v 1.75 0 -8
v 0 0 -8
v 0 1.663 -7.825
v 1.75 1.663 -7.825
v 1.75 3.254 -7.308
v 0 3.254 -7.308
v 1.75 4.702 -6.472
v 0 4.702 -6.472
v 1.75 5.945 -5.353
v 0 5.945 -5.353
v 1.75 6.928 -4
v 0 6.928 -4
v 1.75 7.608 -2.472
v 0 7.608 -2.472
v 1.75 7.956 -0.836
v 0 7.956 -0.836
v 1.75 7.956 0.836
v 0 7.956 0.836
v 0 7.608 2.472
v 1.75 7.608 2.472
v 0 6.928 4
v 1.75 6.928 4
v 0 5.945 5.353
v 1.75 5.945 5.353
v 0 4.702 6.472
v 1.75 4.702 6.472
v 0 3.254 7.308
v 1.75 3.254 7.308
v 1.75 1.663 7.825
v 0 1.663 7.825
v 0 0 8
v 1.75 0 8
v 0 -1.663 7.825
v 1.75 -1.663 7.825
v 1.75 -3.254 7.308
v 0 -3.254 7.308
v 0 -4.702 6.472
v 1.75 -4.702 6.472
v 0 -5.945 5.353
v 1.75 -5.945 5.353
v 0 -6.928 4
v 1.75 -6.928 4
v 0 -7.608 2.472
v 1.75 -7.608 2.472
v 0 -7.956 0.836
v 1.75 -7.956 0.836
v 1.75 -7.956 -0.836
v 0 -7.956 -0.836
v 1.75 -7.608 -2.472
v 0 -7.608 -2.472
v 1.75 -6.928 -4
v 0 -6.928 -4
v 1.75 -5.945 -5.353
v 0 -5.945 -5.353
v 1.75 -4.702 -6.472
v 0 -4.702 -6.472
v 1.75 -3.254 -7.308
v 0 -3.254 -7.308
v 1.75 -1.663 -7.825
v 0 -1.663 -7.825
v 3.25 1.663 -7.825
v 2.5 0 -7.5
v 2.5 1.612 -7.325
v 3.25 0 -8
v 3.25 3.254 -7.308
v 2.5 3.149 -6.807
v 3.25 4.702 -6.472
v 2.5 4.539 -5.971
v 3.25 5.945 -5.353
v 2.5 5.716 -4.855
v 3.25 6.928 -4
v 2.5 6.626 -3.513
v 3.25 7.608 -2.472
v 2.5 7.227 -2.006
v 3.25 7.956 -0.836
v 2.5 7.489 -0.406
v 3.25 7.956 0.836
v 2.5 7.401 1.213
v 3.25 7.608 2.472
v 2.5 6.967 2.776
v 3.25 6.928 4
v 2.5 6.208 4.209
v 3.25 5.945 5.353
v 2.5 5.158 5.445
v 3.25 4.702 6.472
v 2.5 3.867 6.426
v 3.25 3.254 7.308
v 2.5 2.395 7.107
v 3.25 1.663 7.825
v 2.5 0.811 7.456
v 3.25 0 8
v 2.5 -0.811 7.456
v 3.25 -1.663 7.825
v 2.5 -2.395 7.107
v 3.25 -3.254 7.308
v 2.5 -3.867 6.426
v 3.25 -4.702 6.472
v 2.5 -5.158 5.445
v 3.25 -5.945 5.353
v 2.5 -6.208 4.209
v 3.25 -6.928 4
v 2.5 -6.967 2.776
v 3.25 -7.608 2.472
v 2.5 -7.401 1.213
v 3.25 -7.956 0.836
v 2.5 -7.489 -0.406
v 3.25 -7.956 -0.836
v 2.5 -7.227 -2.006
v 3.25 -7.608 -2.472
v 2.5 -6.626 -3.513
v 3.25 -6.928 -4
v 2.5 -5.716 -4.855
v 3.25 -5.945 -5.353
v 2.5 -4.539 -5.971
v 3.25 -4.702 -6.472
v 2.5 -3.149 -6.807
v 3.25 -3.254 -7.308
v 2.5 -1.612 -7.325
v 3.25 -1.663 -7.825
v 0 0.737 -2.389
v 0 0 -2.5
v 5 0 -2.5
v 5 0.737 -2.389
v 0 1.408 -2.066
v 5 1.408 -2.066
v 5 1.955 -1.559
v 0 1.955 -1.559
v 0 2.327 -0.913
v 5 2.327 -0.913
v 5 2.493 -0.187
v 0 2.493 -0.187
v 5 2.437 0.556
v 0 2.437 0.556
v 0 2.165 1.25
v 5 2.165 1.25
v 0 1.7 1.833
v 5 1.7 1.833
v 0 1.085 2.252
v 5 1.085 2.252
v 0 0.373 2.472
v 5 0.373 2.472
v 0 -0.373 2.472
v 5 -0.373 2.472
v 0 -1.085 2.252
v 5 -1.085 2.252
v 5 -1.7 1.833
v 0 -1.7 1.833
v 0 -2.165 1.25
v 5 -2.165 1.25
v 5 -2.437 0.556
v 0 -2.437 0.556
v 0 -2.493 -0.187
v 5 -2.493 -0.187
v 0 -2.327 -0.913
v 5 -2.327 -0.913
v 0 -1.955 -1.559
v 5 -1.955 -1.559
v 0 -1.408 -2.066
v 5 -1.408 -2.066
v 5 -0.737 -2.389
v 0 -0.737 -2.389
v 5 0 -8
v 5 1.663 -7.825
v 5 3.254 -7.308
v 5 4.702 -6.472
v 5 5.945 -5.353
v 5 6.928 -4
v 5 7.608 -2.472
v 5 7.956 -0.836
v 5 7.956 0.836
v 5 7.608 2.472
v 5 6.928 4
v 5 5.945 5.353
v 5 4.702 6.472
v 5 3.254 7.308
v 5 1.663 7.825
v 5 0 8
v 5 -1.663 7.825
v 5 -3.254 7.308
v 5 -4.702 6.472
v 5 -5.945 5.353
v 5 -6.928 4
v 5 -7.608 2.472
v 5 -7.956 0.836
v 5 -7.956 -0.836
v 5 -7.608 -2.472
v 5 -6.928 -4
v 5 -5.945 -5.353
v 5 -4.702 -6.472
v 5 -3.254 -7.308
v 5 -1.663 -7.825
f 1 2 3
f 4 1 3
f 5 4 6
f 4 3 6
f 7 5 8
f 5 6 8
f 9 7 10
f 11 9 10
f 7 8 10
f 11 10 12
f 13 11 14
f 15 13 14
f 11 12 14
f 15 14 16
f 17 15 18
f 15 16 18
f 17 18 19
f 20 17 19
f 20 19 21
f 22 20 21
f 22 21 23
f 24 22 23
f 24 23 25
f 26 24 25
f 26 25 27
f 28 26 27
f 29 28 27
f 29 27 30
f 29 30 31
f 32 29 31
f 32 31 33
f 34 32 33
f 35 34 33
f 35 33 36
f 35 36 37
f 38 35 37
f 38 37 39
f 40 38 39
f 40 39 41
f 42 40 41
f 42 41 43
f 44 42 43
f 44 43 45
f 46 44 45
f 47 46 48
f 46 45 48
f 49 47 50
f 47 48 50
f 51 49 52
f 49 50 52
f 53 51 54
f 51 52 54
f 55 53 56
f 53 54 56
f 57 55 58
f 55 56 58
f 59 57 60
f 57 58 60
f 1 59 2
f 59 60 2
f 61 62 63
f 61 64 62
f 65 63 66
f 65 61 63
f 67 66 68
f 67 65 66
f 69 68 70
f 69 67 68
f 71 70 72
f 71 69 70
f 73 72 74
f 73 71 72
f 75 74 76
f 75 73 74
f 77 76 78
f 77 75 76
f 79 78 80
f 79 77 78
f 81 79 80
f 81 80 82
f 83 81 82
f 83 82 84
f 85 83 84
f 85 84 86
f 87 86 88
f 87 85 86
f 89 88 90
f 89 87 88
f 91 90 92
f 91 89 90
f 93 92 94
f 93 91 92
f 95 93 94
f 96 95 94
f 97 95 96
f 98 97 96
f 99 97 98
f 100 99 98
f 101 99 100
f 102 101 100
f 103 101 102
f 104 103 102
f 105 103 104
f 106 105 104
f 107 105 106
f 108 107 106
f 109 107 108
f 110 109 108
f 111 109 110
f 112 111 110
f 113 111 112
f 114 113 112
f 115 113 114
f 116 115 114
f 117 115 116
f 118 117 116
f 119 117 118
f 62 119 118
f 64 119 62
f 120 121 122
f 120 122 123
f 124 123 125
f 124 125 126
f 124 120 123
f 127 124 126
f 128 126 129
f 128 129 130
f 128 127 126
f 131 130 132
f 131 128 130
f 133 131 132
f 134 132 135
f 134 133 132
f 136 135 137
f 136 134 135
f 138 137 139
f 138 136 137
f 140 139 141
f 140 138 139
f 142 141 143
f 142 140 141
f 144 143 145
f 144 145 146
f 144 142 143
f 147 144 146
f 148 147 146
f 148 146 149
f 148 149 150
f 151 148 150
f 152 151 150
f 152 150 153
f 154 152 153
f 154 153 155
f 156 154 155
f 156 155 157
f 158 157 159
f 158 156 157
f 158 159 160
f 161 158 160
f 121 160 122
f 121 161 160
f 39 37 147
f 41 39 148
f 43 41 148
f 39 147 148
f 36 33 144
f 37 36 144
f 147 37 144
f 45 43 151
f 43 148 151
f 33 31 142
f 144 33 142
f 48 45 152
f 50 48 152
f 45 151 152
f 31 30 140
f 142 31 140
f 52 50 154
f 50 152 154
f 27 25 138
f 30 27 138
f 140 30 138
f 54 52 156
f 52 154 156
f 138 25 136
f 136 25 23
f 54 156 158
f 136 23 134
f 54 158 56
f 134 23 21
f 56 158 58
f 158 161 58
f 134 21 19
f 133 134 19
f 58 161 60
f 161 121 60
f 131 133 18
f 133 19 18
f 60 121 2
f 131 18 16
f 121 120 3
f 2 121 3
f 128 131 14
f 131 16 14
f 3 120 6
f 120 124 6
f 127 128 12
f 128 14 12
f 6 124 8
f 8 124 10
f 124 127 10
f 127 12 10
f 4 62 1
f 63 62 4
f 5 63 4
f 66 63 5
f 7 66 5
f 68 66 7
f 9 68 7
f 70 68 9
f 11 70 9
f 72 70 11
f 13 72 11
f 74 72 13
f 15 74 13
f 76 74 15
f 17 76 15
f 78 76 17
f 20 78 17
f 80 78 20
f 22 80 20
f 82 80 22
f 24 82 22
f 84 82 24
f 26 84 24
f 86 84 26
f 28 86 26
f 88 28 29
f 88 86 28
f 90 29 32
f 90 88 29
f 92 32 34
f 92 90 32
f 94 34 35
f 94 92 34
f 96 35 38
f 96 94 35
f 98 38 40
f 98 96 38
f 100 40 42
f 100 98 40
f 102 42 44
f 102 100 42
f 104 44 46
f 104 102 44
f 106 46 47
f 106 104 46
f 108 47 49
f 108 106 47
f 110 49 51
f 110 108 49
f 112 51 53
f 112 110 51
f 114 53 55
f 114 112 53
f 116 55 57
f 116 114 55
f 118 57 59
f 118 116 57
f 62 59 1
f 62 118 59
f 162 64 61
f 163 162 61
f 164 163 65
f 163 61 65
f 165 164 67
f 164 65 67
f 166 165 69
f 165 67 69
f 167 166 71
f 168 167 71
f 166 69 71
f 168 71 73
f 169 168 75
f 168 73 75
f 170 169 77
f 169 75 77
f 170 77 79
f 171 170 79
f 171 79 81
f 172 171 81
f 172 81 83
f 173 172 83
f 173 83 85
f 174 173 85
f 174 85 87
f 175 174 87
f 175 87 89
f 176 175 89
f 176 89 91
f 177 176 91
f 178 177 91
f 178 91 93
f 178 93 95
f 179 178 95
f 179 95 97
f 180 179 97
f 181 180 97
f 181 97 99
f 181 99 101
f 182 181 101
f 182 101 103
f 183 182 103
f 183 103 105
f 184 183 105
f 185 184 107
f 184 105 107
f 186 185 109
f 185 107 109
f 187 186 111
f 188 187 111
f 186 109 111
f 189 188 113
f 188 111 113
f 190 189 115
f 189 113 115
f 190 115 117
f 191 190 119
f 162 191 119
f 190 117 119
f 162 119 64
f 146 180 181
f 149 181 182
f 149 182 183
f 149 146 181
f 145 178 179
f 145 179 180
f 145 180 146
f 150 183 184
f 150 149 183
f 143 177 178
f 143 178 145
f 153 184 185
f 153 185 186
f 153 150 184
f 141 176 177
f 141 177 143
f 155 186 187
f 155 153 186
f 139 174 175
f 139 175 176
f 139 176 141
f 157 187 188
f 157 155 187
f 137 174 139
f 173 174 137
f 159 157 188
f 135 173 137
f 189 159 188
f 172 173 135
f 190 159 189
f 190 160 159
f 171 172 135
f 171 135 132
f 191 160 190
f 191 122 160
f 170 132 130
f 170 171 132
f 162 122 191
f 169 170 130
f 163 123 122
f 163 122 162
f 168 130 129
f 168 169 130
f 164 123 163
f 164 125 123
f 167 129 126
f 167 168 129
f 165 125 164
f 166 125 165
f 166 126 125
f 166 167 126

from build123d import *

# Parameters (mm, degrees)
SKETCH1_R           = 8
SKETCH1_R_2         = 2.5
BOSS_EXTRUDE1_DEPTH = 5


with BuildPart() as part:
    # Sketch1 → Boss-Extrude1 (new body)
    with BuildSketch(Plane(origin=(0, 0, 0), x_dir=(0, 0, -1), z_dir=(1, 0, 0))):
        Circle(SKETCH1_R)
        Circle(SKETCH1_R_2, mode=Mode.SUBTRACT)
    extrude(amount=BOSS_EXTRUDE1_DEPTH)

    # Sketch2 → Cut-Revolve1 (revolve, cut)
    with BuildSketch(Plane(origin=(0, 0, 0), x_dir=(1, 0, 0), z_dir=(0, 1, 0))):
        Polygon((1.75, 8), (2.5, 7.5), (3.25, 8), align=None)
    revolve(axis=Axis((0, 0, 0), (1, 0, 0)), mode=Mode.SUBTRACT)


solid = part.part
